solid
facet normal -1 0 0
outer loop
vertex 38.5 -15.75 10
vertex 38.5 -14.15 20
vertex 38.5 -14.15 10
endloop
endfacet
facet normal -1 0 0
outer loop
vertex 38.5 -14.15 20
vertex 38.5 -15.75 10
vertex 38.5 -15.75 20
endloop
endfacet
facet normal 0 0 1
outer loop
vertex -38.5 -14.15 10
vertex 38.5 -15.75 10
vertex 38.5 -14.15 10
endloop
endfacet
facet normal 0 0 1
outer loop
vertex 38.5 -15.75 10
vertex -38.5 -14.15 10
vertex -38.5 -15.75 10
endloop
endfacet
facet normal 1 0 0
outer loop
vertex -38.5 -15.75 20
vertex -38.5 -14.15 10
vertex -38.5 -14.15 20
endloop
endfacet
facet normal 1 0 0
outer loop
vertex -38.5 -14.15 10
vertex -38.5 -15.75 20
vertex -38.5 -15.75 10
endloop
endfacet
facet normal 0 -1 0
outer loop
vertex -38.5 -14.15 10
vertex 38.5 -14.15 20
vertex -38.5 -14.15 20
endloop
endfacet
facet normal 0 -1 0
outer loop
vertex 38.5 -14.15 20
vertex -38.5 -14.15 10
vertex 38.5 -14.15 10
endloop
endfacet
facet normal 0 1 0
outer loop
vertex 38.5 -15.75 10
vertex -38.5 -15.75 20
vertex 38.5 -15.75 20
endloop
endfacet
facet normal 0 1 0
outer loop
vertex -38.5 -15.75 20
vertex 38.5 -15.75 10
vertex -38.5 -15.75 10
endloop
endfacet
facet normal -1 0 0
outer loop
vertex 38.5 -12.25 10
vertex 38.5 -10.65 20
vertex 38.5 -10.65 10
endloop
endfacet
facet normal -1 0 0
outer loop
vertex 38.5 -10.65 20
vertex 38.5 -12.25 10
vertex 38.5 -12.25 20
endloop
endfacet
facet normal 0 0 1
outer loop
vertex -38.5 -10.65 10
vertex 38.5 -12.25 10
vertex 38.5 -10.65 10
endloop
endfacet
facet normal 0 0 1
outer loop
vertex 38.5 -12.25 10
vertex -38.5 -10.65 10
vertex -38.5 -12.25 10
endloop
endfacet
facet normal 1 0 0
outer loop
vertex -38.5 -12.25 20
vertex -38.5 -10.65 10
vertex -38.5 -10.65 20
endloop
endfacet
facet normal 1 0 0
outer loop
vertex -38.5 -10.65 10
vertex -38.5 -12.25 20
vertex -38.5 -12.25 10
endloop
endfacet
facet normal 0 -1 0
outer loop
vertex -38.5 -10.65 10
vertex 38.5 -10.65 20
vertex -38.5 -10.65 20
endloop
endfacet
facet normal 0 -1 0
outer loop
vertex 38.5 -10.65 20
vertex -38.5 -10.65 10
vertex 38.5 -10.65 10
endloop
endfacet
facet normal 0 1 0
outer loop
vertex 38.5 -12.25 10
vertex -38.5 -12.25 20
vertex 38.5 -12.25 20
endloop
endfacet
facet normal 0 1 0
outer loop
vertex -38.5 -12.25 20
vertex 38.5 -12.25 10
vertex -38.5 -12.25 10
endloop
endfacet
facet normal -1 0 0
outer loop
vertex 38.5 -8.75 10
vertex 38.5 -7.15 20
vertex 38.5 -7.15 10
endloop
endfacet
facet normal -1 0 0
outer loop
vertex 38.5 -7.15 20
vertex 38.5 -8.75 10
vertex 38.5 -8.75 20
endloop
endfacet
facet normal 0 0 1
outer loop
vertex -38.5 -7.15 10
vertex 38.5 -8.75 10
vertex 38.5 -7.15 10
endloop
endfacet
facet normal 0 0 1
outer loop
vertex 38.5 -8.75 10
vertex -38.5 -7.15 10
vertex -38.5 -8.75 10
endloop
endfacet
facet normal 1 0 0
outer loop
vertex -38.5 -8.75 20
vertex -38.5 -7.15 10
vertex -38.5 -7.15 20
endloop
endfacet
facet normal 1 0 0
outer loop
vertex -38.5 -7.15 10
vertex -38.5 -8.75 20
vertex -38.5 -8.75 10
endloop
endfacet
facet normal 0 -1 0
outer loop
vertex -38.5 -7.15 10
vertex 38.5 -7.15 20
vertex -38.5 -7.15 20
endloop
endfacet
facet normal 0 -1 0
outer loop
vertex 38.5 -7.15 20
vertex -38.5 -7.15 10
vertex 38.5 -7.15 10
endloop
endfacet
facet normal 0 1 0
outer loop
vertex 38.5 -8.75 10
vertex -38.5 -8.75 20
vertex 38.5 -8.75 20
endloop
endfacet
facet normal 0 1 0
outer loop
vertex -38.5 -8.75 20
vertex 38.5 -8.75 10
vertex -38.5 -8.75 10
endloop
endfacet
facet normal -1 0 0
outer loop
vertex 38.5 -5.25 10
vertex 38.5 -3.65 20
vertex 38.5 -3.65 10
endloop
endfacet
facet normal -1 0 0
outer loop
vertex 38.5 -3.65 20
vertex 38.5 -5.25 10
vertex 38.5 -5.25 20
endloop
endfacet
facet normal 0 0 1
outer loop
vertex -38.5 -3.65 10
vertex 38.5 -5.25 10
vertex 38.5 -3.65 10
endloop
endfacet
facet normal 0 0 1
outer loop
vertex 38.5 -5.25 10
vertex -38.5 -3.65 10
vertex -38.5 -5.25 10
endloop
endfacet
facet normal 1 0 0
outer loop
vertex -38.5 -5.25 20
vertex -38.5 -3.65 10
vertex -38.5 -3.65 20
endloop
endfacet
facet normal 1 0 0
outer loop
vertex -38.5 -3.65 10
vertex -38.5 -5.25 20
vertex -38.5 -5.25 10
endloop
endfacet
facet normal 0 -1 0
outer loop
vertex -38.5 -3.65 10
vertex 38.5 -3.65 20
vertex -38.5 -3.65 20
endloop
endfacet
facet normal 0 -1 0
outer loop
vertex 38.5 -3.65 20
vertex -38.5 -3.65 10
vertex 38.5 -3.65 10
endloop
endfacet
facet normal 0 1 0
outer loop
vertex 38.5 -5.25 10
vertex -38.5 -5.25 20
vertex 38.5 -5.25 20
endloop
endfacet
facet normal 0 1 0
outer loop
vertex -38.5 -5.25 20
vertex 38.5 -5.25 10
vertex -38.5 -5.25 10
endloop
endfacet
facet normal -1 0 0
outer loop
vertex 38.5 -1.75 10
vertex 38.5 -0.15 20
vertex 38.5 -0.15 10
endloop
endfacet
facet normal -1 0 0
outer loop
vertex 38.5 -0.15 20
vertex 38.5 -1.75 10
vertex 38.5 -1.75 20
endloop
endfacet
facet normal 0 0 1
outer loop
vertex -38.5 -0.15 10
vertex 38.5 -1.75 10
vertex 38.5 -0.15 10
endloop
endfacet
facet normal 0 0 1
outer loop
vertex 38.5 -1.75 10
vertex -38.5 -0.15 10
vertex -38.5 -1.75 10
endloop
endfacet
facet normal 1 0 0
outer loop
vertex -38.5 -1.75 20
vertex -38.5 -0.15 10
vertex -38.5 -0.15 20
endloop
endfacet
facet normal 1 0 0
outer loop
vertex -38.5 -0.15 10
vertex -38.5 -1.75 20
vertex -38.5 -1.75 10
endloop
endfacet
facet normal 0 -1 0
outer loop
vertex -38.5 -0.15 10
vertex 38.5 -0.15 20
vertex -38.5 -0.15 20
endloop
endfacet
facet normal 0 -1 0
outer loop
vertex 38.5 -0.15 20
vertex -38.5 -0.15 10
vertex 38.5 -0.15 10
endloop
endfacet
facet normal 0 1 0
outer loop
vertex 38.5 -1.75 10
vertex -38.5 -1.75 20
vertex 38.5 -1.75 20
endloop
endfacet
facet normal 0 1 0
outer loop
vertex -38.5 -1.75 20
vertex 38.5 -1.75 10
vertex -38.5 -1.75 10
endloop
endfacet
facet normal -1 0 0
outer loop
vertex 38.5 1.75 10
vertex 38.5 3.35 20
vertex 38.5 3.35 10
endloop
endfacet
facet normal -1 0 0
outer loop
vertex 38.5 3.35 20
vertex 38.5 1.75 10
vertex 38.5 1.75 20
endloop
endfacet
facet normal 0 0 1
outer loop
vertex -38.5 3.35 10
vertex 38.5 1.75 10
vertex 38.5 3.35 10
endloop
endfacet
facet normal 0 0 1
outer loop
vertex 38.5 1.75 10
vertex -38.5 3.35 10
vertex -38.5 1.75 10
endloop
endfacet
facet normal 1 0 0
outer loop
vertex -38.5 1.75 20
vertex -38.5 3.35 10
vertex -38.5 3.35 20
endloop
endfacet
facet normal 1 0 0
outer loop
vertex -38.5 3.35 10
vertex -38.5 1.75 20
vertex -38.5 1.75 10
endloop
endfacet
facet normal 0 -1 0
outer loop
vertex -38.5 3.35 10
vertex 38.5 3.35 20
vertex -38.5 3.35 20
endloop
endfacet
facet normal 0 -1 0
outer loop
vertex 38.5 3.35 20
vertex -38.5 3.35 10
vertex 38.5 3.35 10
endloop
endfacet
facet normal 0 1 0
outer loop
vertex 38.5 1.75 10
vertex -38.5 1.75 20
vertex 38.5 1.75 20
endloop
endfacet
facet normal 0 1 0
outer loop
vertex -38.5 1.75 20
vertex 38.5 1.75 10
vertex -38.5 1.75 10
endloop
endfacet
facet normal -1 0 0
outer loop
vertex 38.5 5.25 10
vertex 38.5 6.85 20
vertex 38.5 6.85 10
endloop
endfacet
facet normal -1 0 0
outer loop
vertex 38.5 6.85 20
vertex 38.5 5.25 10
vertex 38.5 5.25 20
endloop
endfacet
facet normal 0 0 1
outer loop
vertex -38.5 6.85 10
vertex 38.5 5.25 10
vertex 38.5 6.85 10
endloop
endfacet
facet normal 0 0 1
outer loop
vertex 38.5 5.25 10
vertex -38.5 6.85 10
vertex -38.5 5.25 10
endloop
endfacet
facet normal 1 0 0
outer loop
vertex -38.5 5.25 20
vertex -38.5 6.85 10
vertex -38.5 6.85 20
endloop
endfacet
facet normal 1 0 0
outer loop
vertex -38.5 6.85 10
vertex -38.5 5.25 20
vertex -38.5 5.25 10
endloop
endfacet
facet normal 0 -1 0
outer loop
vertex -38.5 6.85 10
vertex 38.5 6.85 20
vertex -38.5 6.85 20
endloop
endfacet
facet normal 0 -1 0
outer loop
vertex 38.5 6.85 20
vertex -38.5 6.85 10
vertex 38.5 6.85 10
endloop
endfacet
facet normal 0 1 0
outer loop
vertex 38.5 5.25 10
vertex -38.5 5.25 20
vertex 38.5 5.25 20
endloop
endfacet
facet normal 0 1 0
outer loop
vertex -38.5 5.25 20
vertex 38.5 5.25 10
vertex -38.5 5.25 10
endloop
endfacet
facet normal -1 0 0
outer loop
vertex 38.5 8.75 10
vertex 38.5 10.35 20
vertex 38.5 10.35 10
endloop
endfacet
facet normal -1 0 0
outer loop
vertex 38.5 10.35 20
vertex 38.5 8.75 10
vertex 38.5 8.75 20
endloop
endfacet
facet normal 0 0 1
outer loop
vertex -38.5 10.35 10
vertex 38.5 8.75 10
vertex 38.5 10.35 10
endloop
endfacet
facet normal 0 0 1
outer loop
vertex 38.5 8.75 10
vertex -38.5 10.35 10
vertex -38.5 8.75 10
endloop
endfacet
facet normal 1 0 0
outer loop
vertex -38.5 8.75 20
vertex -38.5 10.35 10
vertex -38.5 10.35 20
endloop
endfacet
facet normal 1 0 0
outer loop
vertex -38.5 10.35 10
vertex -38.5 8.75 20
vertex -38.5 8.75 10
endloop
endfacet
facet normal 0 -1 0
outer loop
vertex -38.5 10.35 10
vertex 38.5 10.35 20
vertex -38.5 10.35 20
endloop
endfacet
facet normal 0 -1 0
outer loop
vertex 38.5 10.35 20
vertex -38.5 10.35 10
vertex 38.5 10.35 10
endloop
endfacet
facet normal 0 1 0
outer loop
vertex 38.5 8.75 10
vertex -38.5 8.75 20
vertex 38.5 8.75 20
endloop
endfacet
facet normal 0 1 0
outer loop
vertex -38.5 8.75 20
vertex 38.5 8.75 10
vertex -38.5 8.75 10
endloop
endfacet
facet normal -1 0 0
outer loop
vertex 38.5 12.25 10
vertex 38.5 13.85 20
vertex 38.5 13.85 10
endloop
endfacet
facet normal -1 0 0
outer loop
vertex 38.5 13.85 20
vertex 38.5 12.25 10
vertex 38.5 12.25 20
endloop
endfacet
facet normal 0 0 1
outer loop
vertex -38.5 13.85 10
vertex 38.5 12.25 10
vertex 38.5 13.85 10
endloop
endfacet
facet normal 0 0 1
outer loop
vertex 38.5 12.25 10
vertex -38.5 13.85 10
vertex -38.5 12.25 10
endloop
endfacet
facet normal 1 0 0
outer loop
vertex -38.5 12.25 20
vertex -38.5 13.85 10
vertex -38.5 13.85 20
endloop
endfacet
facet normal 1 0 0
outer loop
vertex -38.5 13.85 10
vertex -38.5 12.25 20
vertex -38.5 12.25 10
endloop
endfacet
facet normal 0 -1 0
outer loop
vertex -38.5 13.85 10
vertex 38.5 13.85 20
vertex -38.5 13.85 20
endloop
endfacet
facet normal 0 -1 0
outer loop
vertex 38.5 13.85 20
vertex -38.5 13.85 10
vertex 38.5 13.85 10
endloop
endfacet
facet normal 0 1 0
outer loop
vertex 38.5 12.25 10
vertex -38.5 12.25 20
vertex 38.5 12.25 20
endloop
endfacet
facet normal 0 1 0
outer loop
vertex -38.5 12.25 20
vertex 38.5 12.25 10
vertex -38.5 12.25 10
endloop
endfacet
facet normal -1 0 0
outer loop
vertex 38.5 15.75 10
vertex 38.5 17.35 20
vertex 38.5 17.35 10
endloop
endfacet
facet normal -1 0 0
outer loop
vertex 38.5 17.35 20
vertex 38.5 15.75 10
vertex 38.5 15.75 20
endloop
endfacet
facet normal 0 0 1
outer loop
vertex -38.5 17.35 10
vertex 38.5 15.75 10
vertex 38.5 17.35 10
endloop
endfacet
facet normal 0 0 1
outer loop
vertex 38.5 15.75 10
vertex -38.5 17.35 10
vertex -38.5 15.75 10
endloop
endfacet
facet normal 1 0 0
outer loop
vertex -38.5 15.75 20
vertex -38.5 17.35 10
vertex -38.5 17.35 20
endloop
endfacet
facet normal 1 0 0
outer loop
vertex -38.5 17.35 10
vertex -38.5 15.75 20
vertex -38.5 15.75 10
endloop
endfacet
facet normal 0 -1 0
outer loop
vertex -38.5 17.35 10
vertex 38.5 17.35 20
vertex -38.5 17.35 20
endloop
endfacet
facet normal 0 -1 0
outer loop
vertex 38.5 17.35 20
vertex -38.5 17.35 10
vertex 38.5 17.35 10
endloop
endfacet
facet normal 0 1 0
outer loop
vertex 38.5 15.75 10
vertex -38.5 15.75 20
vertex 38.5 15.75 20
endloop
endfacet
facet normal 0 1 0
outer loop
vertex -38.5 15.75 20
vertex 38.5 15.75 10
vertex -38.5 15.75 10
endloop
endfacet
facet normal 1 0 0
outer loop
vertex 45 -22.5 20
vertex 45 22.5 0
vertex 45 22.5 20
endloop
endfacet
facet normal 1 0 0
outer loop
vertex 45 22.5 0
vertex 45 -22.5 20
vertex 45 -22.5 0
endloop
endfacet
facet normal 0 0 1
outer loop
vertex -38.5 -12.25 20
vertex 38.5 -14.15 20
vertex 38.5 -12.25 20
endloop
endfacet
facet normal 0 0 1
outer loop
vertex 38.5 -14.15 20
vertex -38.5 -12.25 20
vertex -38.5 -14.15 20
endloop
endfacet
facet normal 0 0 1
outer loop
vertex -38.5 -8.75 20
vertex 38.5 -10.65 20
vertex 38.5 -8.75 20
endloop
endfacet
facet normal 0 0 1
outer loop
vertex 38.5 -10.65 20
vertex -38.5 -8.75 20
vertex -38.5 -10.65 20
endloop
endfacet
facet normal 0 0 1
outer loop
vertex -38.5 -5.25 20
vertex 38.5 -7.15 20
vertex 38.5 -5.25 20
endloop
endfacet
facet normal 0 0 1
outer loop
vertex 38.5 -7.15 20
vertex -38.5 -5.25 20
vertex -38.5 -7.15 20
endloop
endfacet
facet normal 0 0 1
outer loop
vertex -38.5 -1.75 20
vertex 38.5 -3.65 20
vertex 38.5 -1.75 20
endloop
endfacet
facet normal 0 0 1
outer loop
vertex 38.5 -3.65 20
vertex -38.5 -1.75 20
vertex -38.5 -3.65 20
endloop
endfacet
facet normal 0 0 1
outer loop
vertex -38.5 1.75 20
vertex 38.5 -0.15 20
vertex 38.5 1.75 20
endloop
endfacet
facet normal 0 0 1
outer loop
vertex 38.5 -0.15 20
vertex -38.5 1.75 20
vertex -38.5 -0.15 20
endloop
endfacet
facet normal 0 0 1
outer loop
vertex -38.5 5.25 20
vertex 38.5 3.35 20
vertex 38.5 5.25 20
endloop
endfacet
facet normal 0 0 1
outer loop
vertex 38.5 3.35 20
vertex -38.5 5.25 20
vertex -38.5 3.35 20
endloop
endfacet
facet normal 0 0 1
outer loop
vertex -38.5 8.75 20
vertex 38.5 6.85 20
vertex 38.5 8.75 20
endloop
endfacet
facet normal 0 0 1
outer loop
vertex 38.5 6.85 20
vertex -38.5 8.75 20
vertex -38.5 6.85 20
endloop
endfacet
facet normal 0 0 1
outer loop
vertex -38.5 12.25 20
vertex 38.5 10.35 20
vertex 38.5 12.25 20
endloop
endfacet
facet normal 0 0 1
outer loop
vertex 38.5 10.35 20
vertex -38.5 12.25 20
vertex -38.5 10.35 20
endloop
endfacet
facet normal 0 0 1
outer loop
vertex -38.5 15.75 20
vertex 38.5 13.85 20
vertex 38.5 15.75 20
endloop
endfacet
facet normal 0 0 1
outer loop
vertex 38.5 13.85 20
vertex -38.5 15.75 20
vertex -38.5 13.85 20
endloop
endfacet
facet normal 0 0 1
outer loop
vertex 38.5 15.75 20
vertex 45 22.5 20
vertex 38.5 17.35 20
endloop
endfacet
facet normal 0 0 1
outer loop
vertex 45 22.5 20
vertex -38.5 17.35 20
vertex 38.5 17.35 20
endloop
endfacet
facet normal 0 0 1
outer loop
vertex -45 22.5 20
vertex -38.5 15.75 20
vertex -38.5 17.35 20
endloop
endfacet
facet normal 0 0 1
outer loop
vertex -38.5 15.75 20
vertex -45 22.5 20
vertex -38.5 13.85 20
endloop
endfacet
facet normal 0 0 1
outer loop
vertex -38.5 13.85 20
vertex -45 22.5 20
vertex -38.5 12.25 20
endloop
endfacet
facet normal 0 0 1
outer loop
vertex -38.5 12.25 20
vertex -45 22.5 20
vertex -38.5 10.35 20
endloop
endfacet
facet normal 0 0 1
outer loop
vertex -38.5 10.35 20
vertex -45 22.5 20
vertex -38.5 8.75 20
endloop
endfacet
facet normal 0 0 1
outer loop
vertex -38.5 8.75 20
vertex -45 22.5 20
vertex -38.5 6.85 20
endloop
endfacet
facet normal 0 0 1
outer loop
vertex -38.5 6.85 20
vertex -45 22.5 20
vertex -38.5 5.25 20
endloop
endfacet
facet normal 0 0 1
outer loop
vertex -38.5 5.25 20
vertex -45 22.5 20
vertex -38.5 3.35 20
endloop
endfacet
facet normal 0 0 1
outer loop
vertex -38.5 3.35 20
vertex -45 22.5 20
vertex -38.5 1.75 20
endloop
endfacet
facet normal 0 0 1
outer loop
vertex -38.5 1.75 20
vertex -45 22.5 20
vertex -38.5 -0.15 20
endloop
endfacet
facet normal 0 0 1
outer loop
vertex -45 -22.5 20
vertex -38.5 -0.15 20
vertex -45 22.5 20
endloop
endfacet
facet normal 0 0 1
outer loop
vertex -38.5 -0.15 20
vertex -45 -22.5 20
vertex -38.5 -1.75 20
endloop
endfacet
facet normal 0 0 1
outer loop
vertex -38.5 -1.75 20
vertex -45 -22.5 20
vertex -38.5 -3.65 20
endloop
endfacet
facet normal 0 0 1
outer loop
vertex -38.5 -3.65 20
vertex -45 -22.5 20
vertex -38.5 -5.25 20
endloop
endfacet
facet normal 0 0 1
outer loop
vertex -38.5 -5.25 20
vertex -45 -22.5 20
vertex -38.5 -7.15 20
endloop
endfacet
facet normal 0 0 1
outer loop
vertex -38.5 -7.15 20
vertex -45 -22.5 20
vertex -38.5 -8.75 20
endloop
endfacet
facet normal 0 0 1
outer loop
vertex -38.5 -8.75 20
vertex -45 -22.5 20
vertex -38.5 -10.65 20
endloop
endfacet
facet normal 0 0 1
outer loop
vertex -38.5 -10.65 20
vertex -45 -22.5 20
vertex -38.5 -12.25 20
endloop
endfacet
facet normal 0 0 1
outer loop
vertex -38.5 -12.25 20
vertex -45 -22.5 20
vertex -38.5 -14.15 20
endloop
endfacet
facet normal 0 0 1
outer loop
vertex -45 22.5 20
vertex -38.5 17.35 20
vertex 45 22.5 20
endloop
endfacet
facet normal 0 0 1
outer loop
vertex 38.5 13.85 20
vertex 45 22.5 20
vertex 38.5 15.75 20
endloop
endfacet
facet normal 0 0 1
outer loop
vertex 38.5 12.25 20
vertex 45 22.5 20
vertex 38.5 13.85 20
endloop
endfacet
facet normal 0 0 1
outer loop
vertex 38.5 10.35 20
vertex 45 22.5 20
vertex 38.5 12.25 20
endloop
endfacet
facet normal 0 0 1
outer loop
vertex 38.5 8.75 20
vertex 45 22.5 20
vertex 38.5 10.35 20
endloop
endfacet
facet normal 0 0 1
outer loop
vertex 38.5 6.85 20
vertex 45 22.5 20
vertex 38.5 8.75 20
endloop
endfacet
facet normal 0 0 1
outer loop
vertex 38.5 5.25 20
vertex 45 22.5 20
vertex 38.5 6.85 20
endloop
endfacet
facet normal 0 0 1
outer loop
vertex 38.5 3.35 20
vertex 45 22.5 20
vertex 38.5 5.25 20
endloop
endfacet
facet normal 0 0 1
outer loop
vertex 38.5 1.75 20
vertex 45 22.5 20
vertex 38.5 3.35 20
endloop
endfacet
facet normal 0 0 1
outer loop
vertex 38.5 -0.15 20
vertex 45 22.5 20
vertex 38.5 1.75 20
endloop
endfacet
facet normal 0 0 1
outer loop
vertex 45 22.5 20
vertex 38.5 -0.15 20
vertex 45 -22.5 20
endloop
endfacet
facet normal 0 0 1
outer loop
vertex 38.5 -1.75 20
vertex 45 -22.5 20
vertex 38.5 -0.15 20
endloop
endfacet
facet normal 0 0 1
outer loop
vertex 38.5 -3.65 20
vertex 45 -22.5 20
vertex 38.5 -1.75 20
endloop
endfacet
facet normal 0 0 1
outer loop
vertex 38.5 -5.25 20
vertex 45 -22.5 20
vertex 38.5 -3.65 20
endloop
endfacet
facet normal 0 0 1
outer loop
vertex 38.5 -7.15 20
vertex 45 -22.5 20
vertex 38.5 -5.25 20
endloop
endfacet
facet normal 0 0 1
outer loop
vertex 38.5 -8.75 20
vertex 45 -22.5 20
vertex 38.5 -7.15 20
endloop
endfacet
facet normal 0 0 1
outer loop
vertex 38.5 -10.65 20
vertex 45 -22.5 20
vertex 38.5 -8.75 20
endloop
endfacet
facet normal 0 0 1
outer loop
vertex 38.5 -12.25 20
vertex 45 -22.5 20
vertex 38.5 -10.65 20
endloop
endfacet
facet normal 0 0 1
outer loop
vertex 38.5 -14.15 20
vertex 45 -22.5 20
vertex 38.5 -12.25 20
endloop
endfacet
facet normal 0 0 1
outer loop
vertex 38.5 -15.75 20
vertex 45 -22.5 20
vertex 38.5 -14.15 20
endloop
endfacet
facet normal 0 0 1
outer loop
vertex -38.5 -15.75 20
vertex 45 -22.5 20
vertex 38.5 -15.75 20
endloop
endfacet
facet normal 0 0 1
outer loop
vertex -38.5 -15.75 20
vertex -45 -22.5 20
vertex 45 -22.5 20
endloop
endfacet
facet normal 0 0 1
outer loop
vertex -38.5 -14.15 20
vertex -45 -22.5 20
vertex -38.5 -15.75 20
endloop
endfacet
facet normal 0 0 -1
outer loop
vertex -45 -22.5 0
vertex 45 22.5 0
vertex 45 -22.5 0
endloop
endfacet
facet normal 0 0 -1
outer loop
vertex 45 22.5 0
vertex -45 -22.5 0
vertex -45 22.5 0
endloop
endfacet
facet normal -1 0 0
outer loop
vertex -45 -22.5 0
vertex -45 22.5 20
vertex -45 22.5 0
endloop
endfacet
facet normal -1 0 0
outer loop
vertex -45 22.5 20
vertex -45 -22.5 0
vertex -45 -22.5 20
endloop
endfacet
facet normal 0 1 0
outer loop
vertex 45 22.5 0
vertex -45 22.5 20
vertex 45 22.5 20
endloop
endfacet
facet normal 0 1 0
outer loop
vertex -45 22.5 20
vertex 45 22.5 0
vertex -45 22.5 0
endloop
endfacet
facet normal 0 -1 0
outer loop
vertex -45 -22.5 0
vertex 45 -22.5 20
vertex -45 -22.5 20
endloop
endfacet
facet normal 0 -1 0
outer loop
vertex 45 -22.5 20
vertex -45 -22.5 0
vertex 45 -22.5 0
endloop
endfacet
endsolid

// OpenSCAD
// Microscope slide drying rack
// Print orientation: base block flat on the bed, slots open upward (+Z)

// ---------------- Parameters ----------------
block_len    = 90;    // base block length along X (mm)
block_wid    = 45;    // base block width along Y (mm)
block_h      = 20;    // base block height along Z (mm)

slot_count   = 10;    // number of slide slots
slot_len     = 77;    // slot length along X (mm)
slot_w       = 1.6;   // slot width along Y (mm)
slot_depth   = 10;    // slot depth from top face (mm)
slot_pitch   = 3.5;   // centre-to-centre slot spacing along Y (mm)

eps          = 0.5;   // overcut past the top face to avoid coplanar faces (mm)

$fn = 64;

// ---------------- Model ----------------
difference() {
    // Base block, centred in X and Y, sitting on z = 0
    translate([-block_len/2, -block_wid/2, 0])
        cube([block_len, block_wid, block_h]);

    // Slot group, centred on the block in X and Y
    for (i = [0 : slot_count - 1]) {
        y = (i - (slot_count - 1)/2) * slot_pitch;
        translate([-slot_len/2, y, block_h - slot_depth])
            cube([slot_len, slot_w, slot_depth + eps]);
    }
}
